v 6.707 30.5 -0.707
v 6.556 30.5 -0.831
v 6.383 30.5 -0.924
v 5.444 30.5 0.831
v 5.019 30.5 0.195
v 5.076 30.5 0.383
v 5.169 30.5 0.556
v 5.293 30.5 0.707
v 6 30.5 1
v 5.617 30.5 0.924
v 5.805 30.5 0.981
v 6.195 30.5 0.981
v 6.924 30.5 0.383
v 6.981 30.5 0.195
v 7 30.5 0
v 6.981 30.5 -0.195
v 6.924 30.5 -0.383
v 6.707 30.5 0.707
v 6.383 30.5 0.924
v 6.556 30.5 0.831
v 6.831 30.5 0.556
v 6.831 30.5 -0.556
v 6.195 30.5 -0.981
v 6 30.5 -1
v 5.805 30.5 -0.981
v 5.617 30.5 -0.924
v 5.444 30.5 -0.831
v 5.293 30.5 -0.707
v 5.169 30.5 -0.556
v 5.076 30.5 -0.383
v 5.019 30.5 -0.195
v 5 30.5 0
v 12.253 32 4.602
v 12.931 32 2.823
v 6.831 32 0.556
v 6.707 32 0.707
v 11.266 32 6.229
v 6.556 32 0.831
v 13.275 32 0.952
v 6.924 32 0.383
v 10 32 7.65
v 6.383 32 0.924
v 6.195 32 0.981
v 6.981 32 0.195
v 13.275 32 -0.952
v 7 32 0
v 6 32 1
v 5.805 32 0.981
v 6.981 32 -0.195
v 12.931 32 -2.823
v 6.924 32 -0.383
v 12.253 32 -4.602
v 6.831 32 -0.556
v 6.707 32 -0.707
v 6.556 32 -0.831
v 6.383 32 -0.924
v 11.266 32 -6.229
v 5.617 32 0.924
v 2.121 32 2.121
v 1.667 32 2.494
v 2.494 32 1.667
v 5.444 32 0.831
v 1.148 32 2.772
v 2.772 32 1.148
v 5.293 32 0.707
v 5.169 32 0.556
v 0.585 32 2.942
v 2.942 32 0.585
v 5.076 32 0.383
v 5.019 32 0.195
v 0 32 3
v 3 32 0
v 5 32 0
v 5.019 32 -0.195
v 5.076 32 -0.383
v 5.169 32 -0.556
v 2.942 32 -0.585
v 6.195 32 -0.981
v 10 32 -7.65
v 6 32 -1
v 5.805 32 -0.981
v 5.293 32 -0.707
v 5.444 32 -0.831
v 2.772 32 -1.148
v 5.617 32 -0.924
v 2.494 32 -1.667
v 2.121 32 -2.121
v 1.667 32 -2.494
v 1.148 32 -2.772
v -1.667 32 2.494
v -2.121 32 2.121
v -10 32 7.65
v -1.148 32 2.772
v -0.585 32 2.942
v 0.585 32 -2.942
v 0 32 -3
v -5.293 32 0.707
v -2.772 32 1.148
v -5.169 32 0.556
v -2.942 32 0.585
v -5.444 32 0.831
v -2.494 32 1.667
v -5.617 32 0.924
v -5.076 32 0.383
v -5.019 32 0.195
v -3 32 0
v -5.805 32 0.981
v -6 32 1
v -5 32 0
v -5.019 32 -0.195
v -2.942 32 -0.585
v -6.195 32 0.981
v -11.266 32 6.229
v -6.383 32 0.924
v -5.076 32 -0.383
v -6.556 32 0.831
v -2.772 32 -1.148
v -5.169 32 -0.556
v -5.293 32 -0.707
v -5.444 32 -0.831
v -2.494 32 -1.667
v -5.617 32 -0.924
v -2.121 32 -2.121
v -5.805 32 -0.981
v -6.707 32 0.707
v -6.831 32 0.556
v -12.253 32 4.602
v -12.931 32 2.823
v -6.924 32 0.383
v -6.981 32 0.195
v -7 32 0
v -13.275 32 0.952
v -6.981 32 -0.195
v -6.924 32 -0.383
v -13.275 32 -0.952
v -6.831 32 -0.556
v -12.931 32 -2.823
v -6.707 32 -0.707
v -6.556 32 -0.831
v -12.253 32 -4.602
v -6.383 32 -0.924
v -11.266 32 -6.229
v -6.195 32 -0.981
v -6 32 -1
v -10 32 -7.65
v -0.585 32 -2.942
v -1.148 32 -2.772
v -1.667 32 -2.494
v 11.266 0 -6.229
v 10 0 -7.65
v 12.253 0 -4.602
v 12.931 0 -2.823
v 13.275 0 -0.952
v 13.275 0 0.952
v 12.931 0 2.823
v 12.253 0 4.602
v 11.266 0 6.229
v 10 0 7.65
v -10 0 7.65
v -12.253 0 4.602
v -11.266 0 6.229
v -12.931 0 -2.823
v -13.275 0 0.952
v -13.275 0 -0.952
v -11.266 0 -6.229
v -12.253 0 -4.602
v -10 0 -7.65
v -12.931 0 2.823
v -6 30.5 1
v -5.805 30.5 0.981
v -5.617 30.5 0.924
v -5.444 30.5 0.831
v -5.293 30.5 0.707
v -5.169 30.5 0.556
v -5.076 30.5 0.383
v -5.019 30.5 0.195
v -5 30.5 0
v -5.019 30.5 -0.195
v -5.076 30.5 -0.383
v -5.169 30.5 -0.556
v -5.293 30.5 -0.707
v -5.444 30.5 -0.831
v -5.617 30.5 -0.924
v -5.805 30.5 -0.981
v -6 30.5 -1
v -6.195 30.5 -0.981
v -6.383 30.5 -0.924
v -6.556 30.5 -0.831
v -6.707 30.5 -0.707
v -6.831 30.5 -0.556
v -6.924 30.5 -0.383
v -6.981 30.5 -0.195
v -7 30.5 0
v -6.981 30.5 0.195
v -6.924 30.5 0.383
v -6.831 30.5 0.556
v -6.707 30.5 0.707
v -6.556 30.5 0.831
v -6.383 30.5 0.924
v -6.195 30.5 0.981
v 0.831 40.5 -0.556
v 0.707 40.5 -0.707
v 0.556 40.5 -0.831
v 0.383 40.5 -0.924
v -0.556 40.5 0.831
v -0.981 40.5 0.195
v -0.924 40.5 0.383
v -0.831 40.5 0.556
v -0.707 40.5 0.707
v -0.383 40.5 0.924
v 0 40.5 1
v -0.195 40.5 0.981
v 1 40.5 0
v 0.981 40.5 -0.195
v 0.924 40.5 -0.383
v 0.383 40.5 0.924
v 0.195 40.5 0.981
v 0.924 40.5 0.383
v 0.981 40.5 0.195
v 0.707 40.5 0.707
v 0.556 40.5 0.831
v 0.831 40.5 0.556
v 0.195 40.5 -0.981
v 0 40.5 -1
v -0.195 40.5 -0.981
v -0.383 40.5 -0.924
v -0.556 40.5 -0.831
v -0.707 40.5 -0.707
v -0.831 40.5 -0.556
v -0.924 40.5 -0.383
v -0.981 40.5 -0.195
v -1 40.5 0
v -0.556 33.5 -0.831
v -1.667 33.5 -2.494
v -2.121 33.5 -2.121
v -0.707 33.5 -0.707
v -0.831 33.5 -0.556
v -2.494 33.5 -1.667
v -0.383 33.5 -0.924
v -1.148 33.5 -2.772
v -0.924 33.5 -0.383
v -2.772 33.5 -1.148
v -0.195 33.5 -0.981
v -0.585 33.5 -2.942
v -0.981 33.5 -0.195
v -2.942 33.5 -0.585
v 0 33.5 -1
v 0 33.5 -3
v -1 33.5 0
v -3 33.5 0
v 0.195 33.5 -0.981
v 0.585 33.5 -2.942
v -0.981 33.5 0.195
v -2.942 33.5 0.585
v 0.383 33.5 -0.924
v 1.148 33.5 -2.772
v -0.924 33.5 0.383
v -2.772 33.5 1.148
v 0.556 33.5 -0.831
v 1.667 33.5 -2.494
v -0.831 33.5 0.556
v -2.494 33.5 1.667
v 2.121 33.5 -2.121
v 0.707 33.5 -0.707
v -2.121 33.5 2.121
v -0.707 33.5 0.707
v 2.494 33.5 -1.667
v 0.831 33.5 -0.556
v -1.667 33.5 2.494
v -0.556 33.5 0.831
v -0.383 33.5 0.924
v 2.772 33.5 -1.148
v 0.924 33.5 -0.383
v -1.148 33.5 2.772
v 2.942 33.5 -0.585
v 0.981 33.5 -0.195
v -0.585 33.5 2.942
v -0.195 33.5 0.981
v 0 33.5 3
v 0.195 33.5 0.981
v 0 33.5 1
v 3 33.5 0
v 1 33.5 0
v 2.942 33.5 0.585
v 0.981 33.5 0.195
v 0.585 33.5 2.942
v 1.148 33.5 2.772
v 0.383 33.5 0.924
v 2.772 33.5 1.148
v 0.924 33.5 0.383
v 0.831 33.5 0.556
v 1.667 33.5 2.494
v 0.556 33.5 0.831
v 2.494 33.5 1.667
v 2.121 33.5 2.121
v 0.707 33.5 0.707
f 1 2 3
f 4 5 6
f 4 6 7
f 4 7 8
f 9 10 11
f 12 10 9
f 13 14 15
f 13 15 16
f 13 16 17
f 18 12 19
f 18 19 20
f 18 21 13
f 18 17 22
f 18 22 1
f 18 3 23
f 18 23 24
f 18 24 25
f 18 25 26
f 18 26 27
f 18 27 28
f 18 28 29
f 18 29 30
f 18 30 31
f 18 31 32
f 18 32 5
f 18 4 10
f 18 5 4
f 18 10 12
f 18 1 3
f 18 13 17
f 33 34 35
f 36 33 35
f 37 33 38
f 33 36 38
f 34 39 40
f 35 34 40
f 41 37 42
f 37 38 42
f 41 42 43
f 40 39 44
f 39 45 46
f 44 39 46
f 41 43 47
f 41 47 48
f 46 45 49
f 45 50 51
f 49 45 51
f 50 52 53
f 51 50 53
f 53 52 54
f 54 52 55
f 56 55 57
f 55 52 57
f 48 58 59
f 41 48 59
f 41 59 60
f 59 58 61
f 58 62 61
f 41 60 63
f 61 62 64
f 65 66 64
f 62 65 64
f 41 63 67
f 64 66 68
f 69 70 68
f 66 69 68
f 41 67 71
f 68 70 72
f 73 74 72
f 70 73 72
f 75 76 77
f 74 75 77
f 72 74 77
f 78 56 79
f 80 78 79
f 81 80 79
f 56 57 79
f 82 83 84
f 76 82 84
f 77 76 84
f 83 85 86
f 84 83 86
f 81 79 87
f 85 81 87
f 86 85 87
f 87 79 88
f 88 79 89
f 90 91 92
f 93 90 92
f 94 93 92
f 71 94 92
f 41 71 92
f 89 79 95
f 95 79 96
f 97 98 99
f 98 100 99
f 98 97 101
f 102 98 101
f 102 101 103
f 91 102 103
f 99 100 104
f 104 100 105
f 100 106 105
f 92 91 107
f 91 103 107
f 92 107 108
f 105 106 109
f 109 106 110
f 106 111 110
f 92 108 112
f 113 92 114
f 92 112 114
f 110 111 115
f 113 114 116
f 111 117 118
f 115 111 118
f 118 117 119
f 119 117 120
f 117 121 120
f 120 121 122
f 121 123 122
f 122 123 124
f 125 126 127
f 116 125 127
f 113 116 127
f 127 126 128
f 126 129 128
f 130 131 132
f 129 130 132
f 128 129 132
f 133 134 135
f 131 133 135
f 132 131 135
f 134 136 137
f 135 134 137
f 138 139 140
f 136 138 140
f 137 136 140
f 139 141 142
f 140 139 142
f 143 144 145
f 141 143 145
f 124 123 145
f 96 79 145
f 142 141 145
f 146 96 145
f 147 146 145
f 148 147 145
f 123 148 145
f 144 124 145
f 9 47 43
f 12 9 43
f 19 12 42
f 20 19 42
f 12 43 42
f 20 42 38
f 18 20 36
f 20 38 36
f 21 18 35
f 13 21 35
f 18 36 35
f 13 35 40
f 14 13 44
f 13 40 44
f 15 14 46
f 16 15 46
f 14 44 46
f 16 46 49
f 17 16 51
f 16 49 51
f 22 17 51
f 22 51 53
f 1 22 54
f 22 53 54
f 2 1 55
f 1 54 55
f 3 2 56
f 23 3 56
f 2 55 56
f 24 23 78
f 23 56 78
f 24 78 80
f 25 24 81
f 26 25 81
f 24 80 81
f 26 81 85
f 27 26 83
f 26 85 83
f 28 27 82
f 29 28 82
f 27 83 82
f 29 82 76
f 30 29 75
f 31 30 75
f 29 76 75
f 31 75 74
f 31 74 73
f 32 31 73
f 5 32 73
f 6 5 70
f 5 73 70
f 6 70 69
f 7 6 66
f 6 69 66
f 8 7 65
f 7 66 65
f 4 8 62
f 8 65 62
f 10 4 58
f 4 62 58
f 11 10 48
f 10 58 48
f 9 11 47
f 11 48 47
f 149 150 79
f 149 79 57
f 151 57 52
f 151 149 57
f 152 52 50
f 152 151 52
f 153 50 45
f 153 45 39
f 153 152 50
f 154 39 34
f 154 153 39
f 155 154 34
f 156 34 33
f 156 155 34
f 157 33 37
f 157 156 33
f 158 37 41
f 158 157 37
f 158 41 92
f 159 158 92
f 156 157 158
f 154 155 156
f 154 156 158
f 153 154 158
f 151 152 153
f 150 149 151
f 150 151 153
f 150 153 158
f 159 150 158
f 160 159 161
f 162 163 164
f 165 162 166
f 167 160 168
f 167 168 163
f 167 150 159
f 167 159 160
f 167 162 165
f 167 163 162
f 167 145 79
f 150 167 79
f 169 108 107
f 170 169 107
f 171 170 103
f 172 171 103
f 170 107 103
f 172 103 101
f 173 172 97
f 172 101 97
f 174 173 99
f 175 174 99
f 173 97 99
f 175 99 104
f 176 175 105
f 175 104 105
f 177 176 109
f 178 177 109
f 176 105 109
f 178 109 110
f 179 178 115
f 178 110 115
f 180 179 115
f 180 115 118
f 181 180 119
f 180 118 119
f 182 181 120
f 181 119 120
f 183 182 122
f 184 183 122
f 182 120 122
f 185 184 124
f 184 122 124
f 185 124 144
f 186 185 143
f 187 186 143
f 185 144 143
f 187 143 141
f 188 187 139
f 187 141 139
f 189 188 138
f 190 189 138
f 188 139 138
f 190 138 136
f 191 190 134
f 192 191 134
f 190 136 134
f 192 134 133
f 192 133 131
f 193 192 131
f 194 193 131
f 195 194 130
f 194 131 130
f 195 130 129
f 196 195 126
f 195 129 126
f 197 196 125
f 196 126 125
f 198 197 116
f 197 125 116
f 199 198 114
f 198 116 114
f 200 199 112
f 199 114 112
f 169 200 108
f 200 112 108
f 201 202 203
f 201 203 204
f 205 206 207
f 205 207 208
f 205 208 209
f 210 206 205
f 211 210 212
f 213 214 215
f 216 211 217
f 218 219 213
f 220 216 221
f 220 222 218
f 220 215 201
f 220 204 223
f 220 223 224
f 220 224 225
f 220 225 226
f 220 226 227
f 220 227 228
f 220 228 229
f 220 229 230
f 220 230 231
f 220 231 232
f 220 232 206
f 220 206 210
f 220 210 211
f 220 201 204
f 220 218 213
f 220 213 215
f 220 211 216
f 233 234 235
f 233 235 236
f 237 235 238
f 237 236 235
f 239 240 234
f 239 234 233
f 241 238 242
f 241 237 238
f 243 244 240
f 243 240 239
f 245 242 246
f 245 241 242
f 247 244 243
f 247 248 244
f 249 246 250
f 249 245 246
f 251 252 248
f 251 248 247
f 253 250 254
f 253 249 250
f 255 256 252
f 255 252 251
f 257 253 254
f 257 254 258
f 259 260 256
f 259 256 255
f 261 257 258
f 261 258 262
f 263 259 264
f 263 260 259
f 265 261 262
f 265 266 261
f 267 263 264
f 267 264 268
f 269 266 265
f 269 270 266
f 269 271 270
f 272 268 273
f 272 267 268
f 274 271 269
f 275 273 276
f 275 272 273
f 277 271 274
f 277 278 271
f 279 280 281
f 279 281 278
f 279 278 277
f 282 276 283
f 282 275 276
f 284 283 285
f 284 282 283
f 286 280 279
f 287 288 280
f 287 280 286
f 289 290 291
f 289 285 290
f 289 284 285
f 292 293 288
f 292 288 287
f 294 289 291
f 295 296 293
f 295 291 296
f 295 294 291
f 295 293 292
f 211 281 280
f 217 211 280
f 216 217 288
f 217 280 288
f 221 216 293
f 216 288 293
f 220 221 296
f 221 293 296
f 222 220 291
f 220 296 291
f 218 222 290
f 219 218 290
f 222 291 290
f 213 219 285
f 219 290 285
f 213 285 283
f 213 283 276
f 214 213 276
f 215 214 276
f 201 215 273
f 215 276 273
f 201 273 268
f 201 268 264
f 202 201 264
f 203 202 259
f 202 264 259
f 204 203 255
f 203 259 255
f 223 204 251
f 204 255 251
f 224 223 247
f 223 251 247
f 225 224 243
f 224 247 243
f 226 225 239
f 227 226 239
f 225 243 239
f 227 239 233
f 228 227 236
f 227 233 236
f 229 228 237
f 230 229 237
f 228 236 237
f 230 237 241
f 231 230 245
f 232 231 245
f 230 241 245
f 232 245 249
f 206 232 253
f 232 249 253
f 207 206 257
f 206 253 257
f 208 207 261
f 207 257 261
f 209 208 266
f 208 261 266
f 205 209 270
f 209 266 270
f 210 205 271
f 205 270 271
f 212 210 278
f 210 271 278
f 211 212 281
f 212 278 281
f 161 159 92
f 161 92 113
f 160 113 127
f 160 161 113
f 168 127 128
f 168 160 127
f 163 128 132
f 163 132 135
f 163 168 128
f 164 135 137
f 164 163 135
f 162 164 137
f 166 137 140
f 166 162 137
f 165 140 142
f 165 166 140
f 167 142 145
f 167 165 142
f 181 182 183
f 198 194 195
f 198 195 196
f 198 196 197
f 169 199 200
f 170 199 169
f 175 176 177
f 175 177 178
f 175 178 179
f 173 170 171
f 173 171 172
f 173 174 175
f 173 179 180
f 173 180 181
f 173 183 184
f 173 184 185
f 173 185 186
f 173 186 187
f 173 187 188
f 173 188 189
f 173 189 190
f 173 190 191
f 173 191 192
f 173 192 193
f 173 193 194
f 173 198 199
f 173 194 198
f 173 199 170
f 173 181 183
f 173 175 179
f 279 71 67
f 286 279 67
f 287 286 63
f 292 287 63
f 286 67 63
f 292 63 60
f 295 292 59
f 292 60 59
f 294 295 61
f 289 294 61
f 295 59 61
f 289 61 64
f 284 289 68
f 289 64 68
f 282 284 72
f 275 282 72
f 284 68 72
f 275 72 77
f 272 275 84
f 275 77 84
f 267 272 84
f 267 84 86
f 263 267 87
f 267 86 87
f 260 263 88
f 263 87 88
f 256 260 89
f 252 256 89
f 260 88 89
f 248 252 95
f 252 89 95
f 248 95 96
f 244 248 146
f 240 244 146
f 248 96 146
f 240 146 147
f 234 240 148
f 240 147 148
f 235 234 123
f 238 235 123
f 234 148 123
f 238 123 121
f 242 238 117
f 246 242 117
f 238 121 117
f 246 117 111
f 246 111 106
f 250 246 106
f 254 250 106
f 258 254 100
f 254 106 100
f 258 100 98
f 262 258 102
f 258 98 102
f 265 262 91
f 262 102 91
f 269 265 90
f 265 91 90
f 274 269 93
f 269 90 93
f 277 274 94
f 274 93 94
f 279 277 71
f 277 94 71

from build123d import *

# Parameters (mm, degrees)
EXTRUDE_1_DEPTH     = 32
SKETCH_2_R          = 3
EXTRUDE_2_DEPTH     = 1.5
SKETCH_3_R          = 1
CUT_EXTRUDE_1_DEPTH = 1.5
SKETCH_4_R          = 1
EXTRUDE_3_DEPTH     = 7


with BuildPart() as part:
    # 草图1 → 凸台-拉伸1 (new body)
    with BuildSketch(Plane(origin=(0, 0, 0), x_dir=(1, 0, 0), z_dir=(0, 1, 0))):
        with BuildLine():
            Line((-10, 7.65), (10, 7.65))
            ThreePointArc((10, 7.65), (13.31807086, 0), (10, -7.65))
            Line((10, -7.65), (-10, -7.65))
            ThreePointArc((-10, -7.65), (-13.31807086, 0), (-10, 7.65))
        make_face()
    extrude(amount=EXTRUDE_1_DEPTH)

    # 草图2 → 凸台-拉伸2 (add)
    with BuildSketch(Plane(origin=(0, 32, 0), x_dir=(1, 0, 0), z_dir=(0, 1, 0))):
        with Locations(Location((0, 0, 0), (0, 0, 270))):
            Circle(SKETCH_2_R)
    extrude(amount=EXTRUDE_2_DEPTH)

    # 草图3 → 切除-拉伸1 (cut)
    with BuildSketch(Plane(origin=(0, 32, 0), x_dir=(1, 0, 0), z_dir=(0, 1, 0))):
        with Locations(Location((-6, 0, 0), (0, 0, 270))):
            Circle(SKETCH_3_R)
        with Locations(Location((6, 0, 0), (0, 0, 270))):
            Circle(SKETCH_3_R)
    extrude(amount=-CUT_EXTRUDE_1_DEPTH, mode=Mode.SUBTRACT)

    # 草图4 → 凸台-拉伸3 (add)
    with BuildSketch(Plane(origin=(0, 33.5, 0), x_dir=(1, 0, 0), z_dir=(0, 1, 0))):
        with Locations(Location((0, 0, 0), (0, 0, 270))):
            Circle(SKETCH_4_R)
    extrude(amount=EXTRUDE_3_DEPTH)


solid = part.part
